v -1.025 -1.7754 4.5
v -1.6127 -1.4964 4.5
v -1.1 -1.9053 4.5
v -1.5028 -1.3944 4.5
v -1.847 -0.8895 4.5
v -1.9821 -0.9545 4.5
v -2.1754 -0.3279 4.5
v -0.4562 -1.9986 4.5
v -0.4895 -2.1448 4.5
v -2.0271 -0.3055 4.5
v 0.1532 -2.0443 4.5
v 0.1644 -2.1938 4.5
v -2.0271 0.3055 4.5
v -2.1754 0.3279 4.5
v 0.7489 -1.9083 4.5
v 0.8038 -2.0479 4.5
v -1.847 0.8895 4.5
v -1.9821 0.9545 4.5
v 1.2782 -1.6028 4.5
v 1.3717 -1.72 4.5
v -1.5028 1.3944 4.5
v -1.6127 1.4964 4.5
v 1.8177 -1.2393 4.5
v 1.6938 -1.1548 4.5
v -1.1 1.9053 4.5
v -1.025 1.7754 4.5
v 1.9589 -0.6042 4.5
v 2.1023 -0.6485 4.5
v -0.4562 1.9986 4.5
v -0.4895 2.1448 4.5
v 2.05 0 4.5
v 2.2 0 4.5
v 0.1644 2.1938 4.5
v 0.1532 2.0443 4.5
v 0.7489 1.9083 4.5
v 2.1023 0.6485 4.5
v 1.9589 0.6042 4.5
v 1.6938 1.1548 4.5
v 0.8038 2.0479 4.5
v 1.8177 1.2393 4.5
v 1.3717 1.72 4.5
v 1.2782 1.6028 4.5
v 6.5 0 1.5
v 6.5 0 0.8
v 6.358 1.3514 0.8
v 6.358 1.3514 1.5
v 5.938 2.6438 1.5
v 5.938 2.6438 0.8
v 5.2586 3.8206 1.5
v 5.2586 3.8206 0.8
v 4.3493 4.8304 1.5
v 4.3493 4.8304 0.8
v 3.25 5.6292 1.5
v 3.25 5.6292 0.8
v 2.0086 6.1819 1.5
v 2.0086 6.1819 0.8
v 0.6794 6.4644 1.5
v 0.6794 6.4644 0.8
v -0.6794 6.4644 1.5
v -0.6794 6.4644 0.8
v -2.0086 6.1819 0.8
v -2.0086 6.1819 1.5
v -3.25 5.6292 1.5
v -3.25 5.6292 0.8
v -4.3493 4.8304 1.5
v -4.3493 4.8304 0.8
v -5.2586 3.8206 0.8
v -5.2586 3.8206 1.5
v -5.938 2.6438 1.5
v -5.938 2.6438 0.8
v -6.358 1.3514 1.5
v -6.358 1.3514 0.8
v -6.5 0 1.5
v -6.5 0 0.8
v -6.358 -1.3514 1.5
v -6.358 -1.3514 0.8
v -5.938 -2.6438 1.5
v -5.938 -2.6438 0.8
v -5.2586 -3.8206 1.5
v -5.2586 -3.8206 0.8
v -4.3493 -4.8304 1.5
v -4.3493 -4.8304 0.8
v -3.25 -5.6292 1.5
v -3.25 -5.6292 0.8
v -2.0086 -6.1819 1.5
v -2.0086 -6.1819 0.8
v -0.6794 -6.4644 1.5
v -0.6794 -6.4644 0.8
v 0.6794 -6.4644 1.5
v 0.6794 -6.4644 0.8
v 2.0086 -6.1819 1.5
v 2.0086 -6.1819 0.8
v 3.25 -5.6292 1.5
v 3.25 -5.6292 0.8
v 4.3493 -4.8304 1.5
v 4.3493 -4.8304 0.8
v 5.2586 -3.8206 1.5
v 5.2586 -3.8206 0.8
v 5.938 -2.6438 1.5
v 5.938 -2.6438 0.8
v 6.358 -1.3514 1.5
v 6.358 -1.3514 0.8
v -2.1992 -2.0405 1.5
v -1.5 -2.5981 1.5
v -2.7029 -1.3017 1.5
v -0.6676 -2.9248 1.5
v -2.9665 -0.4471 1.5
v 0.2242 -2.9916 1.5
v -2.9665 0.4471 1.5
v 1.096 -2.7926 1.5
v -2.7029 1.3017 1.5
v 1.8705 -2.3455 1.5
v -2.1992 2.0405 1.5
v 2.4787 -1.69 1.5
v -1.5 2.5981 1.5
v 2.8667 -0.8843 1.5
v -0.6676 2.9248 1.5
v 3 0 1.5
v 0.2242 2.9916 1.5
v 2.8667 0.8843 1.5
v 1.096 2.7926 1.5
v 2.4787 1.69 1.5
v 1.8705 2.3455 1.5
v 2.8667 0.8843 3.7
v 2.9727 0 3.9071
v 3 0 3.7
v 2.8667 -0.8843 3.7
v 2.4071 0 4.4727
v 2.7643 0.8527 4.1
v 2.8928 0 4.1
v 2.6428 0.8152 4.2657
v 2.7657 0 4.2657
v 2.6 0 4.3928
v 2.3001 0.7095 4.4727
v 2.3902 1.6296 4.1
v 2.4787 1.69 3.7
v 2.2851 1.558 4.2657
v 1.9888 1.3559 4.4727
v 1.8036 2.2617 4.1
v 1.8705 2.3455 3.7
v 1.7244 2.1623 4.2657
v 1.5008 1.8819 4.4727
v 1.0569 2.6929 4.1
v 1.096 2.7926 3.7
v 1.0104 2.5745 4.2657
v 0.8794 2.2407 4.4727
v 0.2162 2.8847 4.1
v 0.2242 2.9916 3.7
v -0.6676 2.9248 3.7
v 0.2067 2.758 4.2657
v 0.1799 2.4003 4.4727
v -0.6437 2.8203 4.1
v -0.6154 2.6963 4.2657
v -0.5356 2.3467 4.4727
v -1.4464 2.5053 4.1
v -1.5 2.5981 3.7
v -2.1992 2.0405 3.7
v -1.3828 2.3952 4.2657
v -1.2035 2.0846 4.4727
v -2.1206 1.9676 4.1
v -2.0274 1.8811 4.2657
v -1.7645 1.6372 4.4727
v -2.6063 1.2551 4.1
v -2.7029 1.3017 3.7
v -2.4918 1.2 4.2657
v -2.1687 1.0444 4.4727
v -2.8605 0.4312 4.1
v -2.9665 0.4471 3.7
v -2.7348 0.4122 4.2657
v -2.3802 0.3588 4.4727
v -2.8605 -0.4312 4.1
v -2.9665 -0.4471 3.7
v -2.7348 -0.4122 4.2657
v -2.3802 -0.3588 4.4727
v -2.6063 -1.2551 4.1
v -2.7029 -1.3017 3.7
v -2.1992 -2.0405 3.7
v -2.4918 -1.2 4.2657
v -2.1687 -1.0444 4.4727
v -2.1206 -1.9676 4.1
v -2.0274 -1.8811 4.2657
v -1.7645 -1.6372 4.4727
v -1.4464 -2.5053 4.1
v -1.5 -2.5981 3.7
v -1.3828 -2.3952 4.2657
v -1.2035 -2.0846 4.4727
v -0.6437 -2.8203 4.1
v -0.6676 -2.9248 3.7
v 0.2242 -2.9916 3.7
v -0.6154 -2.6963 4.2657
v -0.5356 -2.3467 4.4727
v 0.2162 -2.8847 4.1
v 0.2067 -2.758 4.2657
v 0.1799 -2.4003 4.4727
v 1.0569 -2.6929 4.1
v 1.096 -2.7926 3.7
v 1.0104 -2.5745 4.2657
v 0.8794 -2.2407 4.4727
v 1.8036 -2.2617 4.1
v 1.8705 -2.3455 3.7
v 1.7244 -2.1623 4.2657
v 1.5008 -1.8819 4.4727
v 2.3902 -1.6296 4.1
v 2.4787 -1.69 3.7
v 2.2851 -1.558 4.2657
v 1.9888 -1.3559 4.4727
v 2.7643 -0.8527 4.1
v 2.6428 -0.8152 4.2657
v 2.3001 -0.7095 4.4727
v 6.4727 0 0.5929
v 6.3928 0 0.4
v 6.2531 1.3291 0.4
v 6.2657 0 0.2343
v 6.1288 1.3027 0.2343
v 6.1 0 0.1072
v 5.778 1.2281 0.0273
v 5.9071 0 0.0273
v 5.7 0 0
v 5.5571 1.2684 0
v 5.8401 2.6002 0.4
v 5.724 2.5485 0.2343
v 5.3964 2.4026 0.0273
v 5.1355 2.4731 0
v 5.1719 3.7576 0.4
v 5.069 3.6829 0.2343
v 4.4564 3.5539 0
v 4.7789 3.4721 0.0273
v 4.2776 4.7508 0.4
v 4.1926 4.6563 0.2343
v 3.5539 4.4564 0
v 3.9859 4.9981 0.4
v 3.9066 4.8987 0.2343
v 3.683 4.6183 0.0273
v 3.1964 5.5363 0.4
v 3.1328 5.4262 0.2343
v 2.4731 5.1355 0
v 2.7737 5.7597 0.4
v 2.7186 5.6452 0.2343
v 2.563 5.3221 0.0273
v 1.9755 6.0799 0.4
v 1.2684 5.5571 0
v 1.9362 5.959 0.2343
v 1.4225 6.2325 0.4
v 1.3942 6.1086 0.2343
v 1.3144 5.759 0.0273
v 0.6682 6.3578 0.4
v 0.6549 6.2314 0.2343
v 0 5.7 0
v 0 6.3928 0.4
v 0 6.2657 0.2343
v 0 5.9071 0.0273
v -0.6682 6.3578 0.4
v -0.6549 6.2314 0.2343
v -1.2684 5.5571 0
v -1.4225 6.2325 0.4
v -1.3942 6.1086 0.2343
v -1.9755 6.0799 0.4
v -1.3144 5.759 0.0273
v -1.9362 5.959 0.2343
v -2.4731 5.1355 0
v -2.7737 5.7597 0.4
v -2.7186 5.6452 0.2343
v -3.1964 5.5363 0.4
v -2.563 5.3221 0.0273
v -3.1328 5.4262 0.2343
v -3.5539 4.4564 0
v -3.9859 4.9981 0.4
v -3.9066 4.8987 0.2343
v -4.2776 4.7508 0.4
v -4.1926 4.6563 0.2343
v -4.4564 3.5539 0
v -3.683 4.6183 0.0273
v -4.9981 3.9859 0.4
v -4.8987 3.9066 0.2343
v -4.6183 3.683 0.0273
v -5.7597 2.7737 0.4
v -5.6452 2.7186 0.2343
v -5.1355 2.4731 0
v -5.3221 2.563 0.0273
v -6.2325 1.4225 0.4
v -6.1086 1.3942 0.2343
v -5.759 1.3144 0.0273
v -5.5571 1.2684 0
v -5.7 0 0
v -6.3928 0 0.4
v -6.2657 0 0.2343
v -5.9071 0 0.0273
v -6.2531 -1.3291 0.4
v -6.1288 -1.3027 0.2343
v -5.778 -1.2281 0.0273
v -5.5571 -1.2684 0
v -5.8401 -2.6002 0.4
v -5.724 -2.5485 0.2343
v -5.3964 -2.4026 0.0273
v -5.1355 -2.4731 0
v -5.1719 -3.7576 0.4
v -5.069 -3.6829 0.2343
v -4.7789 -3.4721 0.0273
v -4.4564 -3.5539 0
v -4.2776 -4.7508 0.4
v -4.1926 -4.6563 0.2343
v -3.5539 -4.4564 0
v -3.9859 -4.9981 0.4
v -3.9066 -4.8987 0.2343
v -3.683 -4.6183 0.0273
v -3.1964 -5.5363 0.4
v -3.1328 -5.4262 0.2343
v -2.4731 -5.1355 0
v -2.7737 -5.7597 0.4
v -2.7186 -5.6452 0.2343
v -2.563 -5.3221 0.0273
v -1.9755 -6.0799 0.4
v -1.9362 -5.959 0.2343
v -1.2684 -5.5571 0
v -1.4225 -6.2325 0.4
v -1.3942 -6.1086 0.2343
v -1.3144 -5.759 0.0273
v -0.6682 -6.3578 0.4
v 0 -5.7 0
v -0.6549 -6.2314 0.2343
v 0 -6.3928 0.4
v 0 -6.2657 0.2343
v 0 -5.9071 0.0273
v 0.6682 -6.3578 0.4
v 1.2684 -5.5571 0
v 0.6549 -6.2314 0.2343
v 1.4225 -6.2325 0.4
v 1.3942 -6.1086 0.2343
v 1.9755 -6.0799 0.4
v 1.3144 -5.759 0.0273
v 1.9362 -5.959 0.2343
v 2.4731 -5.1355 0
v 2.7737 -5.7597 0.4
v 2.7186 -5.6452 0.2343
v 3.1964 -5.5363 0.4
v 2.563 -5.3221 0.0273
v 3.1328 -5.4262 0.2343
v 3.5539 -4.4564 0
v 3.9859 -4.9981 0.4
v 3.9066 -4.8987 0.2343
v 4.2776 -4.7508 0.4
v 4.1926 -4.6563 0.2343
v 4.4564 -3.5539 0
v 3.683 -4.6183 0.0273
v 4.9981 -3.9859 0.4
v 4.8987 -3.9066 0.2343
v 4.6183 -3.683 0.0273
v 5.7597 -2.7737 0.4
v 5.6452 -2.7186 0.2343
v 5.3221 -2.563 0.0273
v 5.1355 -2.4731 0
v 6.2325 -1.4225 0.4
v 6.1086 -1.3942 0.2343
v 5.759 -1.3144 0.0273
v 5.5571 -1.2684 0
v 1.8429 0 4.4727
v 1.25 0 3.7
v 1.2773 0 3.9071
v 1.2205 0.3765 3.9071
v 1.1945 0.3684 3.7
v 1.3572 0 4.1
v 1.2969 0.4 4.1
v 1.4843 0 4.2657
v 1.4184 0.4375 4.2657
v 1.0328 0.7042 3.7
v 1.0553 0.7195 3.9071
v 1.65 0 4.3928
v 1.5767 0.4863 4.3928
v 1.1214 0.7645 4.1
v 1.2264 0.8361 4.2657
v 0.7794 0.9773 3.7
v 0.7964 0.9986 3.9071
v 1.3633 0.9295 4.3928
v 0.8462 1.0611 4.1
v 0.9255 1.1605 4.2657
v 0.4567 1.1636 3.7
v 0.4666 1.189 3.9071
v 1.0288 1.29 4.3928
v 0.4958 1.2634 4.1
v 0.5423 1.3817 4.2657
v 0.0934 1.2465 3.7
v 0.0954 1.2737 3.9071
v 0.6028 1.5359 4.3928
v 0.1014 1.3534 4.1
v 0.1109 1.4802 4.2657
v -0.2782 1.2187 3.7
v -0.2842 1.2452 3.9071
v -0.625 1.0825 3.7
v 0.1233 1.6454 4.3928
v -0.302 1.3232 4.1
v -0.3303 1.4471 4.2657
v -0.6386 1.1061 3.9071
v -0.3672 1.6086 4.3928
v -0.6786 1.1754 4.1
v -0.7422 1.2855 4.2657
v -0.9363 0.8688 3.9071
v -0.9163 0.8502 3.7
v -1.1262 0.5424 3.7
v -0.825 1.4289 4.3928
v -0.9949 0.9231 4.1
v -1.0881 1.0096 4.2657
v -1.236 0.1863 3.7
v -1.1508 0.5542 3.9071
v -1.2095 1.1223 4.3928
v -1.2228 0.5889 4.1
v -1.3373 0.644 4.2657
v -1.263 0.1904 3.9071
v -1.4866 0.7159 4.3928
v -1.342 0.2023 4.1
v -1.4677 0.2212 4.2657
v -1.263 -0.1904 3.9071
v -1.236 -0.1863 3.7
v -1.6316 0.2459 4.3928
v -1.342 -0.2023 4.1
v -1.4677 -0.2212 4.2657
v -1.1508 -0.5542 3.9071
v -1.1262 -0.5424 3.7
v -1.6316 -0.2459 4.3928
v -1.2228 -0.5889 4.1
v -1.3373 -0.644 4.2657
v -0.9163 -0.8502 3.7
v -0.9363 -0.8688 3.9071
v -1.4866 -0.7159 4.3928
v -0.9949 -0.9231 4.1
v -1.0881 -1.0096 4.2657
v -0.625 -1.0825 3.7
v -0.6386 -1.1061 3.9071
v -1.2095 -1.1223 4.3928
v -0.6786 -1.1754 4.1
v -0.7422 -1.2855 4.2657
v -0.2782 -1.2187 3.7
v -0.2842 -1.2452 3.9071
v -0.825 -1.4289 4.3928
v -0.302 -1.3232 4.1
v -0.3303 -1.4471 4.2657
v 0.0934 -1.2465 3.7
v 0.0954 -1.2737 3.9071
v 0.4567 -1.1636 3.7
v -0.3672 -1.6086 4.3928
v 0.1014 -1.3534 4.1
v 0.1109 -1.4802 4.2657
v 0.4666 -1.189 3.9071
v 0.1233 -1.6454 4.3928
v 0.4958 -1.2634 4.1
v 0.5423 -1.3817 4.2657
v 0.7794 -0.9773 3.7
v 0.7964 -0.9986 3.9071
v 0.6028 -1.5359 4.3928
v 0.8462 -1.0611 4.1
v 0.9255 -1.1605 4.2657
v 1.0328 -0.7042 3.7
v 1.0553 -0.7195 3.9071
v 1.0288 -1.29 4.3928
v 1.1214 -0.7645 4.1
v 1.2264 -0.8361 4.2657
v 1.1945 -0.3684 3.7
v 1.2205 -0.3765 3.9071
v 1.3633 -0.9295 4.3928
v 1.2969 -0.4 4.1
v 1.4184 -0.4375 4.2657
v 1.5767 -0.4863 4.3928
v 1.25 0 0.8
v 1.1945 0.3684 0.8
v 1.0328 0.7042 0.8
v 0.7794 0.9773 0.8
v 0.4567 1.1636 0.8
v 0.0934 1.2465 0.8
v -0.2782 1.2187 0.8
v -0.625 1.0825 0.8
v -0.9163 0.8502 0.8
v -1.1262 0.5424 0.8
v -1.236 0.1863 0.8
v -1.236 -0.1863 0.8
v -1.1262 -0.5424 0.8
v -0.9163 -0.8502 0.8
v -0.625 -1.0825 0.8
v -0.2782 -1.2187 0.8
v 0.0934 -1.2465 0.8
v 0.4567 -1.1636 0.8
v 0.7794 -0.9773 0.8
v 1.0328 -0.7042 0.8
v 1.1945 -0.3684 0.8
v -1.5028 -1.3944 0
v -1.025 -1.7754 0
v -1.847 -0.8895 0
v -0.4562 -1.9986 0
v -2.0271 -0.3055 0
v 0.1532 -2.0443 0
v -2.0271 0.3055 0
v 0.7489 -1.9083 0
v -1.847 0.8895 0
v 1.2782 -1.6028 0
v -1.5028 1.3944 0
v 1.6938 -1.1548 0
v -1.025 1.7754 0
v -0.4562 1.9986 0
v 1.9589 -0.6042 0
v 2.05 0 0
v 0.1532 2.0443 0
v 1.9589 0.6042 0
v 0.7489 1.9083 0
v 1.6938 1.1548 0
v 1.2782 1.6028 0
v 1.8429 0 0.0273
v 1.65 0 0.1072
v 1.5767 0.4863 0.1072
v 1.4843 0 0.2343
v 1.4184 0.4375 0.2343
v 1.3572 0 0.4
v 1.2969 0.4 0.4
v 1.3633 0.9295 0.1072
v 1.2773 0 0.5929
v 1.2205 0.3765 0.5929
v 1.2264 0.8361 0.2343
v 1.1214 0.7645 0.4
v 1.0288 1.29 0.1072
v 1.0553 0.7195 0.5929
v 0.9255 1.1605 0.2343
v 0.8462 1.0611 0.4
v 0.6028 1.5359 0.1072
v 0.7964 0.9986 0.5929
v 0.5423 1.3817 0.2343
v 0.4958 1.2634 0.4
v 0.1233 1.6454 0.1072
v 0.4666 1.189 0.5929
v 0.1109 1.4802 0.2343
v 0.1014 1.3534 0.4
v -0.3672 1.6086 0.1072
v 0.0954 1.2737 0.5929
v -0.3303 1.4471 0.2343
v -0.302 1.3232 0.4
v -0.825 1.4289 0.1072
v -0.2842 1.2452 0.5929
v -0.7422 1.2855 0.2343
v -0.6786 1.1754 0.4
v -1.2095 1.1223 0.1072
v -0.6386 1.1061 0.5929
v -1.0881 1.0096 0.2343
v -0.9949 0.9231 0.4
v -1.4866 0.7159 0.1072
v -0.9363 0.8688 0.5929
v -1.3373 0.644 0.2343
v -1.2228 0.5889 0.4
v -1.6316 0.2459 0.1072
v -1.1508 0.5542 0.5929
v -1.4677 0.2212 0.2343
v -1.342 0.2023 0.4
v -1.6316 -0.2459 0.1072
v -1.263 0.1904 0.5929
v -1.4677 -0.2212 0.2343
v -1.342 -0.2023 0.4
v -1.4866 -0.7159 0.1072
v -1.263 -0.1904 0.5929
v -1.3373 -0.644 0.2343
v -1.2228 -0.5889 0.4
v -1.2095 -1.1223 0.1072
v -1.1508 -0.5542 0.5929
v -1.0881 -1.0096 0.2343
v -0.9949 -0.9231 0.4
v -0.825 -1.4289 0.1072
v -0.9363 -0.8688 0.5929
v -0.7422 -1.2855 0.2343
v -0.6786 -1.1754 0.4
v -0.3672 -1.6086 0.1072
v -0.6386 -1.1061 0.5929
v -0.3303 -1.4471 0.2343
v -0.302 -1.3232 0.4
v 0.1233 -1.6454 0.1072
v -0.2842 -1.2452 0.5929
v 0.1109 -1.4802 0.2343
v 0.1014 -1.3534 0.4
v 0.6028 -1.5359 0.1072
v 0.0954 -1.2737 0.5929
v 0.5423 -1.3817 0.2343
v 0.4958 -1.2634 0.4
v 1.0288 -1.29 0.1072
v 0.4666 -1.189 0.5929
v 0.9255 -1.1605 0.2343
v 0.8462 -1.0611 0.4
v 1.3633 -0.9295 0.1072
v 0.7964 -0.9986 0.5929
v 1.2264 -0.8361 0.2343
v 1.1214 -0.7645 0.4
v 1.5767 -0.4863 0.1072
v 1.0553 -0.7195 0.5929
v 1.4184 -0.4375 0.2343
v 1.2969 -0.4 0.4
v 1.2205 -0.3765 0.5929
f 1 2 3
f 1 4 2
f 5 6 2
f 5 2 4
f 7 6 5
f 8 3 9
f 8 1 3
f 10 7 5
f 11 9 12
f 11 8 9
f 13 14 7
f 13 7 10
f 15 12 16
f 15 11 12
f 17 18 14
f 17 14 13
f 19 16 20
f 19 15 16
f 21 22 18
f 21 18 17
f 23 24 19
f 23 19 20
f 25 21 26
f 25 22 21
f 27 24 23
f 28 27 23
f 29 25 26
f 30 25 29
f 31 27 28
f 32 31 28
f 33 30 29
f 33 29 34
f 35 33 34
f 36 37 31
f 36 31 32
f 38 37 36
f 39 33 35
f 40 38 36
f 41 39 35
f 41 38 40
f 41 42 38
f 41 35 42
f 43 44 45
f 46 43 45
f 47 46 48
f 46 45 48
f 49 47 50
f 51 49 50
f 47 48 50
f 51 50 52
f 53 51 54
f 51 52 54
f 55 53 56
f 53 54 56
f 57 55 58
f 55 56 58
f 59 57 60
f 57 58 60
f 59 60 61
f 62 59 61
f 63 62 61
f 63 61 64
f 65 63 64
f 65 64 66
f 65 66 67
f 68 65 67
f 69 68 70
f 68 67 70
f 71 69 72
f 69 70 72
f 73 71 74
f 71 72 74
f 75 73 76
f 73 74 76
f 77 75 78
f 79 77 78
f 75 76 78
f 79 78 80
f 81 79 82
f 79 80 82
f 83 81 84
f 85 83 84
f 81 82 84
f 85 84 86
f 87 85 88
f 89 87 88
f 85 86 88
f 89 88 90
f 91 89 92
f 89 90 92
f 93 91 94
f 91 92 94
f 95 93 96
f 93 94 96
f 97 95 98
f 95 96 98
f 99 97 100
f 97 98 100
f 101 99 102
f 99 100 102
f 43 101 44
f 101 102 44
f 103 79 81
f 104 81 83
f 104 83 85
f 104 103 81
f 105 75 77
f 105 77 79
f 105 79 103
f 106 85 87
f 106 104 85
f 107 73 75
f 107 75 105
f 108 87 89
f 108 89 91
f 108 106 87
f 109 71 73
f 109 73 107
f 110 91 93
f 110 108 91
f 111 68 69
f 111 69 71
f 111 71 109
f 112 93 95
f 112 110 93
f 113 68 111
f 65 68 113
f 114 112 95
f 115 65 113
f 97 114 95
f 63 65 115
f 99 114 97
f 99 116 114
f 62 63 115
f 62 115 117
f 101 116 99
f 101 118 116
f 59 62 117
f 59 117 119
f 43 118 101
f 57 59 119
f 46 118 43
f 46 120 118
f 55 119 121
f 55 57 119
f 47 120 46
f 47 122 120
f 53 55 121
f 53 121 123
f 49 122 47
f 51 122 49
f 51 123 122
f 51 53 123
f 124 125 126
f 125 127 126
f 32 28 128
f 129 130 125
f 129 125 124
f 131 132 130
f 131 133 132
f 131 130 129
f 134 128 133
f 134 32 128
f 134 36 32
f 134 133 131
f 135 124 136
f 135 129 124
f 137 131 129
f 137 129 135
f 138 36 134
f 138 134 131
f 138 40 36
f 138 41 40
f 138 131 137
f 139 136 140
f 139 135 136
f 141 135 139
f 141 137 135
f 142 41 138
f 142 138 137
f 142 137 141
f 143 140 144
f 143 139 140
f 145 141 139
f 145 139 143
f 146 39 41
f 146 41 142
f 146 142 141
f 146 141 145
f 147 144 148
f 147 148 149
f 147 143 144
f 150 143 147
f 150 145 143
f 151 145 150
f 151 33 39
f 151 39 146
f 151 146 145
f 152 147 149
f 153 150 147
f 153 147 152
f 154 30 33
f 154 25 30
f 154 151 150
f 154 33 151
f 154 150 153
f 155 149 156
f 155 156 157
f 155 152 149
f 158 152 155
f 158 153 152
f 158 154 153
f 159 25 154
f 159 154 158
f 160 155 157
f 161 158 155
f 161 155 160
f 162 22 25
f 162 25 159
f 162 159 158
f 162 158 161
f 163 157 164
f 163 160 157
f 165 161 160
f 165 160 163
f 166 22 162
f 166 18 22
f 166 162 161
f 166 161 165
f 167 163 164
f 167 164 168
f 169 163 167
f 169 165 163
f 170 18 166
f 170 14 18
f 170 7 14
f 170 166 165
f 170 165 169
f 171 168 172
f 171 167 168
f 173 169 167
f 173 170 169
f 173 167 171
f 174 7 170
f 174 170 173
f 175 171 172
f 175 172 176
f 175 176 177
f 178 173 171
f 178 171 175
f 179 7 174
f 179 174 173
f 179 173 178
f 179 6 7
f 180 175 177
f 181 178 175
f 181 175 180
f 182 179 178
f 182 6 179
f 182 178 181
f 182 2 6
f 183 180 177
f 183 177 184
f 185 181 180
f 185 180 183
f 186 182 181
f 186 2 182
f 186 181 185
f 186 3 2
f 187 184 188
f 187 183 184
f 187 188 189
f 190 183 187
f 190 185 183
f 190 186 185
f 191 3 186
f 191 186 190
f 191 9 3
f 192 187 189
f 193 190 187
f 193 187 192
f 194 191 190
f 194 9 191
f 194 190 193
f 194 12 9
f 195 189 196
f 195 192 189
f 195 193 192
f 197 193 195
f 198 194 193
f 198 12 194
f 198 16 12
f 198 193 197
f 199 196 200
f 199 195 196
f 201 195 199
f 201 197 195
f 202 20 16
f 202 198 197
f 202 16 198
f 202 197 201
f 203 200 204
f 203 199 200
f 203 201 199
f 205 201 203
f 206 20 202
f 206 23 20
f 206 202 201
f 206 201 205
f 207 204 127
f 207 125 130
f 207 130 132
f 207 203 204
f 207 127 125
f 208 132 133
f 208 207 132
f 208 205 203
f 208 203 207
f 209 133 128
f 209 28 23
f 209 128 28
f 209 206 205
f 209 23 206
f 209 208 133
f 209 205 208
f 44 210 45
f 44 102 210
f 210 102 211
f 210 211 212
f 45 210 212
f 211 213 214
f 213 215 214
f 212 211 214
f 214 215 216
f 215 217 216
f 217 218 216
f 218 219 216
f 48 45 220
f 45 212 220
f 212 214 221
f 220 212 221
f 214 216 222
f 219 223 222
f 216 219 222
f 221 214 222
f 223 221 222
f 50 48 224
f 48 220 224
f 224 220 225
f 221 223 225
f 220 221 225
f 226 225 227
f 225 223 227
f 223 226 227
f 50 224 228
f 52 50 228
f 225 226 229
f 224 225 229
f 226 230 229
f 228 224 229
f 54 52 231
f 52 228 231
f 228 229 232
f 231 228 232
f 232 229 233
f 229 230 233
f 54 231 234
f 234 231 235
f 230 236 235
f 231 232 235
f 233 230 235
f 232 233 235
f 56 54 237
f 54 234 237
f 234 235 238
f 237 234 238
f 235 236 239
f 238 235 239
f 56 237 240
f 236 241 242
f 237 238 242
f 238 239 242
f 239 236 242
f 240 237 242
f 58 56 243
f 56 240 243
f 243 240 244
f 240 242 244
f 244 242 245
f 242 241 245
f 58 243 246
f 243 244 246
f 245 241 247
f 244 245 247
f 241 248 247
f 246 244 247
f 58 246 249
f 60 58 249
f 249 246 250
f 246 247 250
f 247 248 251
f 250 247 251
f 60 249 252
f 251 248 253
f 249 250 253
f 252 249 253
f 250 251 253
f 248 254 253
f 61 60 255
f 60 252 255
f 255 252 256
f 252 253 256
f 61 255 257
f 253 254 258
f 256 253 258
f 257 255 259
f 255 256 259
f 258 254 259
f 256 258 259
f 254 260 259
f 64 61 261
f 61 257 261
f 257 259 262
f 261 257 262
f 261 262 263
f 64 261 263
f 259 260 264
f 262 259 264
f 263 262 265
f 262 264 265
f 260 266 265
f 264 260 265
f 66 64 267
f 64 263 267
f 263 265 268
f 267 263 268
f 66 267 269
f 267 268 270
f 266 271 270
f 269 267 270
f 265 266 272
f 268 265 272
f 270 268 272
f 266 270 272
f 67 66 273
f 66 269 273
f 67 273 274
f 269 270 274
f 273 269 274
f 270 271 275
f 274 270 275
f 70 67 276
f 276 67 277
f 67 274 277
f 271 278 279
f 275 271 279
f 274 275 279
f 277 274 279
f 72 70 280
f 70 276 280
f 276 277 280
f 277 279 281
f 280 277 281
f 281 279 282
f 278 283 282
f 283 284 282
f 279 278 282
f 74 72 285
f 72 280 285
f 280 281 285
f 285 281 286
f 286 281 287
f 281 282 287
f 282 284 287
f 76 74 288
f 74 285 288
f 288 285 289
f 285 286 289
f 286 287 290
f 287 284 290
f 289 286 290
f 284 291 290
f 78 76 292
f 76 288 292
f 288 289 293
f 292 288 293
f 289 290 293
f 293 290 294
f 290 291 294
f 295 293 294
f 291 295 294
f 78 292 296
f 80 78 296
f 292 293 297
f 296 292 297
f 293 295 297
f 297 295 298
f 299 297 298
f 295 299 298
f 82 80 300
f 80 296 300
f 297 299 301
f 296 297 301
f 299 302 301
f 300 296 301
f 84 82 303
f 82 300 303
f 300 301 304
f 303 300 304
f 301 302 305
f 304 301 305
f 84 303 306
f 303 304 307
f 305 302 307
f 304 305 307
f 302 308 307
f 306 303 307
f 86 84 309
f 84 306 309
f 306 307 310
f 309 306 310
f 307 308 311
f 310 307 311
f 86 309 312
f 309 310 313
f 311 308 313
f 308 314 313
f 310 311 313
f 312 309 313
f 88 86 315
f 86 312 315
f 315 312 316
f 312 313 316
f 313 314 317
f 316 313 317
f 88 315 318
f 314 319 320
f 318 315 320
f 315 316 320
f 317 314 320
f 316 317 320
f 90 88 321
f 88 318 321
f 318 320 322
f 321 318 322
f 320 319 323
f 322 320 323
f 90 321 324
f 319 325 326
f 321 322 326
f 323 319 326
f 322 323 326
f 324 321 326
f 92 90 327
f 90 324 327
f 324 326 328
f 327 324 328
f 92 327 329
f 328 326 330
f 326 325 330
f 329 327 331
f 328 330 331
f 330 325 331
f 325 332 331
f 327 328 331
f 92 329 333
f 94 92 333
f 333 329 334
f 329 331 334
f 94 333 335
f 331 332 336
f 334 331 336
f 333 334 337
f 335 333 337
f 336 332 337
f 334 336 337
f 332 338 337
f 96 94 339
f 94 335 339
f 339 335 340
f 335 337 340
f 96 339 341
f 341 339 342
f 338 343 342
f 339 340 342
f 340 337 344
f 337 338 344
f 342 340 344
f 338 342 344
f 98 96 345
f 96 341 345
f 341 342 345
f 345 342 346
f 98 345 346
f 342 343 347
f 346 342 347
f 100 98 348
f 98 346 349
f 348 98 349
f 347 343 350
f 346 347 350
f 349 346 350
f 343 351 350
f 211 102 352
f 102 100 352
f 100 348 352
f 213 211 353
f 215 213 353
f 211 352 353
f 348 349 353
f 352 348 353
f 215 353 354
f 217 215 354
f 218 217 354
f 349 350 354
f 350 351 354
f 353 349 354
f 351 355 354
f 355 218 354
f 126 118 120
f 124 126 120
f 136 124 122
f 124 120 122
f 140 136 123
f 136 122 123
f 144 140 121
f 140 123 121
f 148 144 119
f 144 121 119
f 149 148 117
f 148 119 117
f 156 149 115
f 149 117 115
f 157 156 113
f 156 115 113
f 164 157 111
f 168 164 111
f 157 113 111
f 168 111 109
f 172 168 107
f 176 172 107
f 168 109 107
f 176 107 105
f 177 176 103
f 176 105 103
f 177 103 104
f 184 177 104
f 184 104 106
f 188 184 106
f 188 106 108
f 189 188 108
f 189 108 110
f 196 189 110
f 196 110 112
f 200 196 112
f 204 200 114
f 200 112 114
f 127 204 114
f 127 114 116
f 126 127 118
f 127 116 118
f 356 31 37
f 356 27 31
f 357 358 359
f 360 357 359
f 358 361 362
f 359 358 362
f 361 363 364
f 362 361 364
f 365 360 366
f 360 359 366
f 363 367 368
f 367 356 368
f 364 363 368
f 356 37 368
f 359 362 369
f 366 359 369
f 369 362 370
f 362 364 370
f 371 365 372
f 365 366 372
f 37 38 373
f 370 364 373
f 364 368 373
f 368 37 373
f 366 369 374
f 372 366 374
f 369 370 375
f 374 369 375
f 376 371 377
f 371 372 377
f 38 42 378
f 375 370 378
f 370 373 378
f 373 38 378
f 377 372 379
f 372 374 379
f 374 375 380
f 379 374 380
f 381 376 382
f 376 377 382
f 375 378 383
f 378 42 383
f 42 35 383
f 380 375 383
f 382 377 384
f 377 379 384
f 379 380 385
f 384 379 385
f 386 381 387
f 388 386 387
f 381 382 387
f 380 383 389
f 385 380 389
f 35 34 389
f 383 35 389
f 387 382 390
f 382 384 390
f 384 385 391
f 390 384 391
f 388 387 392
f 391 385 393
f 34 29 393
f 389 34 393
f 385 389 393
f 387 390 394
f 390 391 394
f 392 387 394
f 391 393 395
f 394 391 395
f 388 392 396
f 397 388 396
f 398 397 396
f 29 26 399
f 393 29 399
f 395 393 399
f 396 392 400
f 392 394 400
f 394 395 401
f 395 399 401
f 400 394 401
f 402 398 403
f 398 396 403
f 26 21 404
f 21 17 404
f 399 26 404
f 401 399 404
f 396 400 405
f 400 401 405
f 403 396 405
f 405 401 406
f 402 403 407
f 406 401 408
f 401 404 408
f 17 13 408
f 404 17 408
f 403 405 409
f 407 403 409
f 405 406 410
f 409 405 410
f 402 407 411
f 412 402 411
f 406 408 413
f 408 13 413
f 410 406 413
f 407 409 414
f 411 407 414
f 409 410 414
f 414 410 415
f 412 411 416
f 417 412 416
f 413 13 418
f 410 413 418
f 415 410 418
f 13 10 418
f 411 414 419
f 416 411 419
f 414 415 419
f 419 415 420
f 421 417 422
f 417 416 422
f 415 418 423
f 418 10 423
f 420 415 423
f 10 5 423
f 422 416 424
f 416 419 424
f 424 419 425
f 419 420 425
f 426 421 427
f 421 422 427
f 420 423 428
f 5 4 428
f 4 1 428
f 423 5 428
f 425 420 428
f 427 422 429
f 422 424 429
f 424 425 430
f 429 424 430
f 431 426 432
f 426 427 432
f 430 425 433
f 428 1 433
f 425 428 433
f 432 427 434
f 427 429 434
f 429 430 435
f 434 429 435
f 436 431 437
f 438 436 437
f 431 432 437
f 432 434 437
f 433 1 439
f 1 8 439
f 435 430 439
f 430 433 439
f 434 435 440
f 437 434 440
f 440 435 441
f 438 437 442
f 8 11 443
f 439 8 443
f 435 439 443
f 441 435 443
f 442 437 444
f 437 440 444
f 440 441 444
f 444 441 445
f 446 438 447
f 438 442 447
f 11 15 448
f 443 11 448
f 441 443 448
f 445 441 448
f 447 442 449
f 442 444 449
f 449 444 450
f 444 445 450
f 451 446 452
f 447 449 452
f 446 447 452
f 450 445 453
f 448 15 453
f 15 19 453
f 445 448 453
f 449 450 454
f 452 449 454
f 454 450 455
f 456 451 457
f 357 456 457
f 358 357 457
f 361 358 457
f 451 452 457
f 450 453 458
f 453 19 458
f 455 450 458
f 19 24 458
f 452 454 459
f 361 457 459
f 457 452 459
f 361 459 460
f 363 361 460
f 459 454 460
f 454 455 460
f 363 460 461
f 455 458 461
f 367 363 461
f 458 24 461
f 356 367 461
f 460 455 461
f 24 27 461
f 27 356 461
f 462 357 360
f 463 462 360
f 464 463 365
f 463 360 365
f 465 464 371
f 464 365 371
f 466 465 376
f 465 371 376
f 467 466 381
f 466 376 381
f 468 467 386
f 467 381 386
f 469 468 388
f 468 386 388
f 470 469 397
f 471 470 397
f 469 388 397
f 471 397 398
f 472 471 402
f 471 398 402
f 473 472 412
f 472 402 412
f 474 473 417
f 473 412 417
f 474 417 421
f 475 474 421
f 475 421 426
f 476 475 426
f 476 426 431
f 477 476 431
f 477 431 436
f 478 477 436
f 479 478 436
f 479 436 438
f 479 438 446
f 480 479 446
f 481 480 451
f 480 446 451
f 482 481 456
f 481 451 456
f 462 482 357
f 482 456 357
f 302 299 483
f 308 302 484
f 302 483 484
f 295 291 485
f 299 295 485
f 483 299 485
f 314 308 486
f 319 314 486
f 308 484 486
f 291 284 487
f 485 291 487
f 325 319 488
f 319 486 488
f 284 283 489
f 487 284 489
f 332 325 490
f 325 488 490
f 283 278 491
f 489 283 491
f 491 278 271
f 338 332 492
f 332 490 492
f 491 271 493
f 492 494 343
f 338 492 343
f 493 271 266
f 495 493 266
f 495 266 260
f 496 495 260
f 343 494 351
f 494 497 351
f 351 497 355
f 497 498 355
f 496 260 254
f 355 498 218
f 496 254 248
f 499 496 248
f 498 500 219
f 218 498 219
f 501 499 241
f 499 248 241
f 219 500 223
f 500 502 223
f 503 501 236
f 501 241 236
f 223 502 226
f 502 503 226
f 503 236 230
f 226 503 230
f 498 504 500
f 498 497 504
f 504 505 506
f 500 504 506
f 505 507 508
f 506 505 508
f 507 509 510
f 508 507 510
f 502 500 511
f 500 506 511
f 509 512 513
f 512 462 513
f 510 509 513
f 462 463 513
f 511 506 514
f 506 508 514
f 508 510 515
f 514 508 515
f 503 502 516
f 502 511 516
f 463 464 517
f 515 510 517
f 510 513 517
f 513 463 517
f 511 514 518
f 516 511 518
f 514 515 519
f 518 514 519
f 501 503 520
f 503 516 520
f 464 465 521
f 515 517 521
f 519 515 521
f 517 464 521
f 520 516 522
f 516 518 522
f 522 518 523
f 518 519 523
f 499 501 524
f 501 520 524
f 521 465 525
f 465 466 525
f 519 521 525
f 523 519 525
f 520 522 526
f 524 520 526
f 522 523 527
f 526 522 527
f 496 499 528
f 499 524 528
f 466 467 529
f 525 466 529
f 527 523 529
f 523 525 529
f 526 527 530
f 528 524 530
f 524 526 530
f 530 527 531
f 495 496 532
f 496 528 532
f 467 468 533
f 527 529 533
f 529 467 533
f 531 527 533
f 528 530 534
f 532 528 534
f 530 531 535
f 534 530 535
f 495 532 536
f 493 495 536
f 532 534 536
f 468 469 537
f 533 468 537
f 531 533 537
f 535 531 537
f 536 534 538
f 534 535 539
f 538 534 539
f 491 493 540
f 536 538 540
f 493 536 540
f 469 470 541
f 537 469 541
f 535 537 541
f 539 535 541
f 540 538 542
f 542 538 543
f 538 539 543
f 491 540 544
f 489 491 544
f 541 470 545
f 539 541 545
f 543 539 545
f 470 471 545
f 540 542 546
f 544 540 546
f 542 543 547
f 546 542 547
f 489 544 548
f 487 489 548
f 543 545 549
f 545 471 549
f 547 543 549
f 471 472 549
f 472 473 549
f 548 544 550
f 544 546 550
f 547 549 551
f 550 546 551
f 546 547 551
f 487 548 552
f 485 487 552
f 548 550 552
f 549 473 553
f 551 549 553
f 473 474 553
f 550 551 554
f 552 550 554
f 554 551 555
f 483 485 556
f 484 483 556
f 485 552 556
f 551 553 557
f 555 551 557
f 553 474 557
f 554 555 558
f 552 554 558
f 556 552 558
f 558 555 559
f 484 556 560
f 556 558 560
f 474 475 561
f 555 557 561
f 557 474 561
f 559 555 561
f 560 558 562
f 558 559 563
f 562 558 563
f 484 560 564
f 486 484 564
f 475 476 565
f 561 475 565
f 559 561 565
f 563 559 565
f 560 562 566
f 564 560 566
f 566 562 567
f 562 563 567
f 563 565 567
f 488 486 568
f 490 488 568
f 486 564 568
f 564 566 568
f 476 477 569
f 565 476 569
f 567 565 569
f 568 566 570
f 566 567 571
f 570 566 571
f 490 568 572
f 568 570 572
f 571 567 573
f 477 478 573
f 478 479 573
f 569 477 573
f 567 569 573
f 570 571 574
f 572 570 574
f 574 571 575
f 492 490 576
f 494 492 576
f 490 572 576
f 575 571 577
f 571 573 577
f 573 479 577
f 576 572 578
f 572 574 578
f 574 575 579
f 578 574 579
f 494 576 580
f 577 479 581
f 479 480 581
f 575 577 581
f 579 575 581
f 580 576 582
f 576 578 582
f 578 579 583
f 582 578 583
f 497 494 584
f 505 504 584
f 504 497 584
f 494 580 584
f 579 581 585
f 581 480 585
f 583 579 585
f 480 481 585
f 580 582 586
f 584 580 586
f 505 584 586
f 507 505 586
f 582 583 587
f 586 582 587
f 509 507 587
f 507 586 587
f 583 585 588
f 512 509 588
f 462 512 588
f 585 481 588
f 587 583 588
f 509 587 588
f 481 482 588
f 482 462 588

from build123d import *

# Parameters (mm, degrees)
F0_R     = 6.5
F1_DEPTH = 1.5
F2_R     = 3
F3_DEPTH = 3
F4_R     = 1.25
F5_DEPTH = 4.5
F6_R     = 0.8


with BuildPart() as f1:
    # F0 (on Top) → F1 (new body)
    with BuildSketch(Plane.XY):
        Circle(F0_R)
    extrude(amount=F1_DEPTH)

    # F2 (on face) → F3 (join)
    with BuildSketch(Plane.XY.offset(1.5)):
        Circle(F2_R)
    extrude(amount=F3_DEPTH)

    # F4 (on face) → F5 (cut, through all)
    with BuildSketch(Plane.XY.offset(4.5)):
        Circle(F4_R)
    extrude(amount=-F5_DEPTH, mode=Mode.SUBTRACT)

    # F6
    f6_edges = [f1.edges().sort_by_distance(p)[0] for p in [
        (-3, 0, 4.5),
        (-6.5, 0, 0),
        (-1.25, 0, 4.5),
        (-1.25, 0, 0),
    ]]
    fillet(f6_edges, radius=F6_R)


solid = f1.part
